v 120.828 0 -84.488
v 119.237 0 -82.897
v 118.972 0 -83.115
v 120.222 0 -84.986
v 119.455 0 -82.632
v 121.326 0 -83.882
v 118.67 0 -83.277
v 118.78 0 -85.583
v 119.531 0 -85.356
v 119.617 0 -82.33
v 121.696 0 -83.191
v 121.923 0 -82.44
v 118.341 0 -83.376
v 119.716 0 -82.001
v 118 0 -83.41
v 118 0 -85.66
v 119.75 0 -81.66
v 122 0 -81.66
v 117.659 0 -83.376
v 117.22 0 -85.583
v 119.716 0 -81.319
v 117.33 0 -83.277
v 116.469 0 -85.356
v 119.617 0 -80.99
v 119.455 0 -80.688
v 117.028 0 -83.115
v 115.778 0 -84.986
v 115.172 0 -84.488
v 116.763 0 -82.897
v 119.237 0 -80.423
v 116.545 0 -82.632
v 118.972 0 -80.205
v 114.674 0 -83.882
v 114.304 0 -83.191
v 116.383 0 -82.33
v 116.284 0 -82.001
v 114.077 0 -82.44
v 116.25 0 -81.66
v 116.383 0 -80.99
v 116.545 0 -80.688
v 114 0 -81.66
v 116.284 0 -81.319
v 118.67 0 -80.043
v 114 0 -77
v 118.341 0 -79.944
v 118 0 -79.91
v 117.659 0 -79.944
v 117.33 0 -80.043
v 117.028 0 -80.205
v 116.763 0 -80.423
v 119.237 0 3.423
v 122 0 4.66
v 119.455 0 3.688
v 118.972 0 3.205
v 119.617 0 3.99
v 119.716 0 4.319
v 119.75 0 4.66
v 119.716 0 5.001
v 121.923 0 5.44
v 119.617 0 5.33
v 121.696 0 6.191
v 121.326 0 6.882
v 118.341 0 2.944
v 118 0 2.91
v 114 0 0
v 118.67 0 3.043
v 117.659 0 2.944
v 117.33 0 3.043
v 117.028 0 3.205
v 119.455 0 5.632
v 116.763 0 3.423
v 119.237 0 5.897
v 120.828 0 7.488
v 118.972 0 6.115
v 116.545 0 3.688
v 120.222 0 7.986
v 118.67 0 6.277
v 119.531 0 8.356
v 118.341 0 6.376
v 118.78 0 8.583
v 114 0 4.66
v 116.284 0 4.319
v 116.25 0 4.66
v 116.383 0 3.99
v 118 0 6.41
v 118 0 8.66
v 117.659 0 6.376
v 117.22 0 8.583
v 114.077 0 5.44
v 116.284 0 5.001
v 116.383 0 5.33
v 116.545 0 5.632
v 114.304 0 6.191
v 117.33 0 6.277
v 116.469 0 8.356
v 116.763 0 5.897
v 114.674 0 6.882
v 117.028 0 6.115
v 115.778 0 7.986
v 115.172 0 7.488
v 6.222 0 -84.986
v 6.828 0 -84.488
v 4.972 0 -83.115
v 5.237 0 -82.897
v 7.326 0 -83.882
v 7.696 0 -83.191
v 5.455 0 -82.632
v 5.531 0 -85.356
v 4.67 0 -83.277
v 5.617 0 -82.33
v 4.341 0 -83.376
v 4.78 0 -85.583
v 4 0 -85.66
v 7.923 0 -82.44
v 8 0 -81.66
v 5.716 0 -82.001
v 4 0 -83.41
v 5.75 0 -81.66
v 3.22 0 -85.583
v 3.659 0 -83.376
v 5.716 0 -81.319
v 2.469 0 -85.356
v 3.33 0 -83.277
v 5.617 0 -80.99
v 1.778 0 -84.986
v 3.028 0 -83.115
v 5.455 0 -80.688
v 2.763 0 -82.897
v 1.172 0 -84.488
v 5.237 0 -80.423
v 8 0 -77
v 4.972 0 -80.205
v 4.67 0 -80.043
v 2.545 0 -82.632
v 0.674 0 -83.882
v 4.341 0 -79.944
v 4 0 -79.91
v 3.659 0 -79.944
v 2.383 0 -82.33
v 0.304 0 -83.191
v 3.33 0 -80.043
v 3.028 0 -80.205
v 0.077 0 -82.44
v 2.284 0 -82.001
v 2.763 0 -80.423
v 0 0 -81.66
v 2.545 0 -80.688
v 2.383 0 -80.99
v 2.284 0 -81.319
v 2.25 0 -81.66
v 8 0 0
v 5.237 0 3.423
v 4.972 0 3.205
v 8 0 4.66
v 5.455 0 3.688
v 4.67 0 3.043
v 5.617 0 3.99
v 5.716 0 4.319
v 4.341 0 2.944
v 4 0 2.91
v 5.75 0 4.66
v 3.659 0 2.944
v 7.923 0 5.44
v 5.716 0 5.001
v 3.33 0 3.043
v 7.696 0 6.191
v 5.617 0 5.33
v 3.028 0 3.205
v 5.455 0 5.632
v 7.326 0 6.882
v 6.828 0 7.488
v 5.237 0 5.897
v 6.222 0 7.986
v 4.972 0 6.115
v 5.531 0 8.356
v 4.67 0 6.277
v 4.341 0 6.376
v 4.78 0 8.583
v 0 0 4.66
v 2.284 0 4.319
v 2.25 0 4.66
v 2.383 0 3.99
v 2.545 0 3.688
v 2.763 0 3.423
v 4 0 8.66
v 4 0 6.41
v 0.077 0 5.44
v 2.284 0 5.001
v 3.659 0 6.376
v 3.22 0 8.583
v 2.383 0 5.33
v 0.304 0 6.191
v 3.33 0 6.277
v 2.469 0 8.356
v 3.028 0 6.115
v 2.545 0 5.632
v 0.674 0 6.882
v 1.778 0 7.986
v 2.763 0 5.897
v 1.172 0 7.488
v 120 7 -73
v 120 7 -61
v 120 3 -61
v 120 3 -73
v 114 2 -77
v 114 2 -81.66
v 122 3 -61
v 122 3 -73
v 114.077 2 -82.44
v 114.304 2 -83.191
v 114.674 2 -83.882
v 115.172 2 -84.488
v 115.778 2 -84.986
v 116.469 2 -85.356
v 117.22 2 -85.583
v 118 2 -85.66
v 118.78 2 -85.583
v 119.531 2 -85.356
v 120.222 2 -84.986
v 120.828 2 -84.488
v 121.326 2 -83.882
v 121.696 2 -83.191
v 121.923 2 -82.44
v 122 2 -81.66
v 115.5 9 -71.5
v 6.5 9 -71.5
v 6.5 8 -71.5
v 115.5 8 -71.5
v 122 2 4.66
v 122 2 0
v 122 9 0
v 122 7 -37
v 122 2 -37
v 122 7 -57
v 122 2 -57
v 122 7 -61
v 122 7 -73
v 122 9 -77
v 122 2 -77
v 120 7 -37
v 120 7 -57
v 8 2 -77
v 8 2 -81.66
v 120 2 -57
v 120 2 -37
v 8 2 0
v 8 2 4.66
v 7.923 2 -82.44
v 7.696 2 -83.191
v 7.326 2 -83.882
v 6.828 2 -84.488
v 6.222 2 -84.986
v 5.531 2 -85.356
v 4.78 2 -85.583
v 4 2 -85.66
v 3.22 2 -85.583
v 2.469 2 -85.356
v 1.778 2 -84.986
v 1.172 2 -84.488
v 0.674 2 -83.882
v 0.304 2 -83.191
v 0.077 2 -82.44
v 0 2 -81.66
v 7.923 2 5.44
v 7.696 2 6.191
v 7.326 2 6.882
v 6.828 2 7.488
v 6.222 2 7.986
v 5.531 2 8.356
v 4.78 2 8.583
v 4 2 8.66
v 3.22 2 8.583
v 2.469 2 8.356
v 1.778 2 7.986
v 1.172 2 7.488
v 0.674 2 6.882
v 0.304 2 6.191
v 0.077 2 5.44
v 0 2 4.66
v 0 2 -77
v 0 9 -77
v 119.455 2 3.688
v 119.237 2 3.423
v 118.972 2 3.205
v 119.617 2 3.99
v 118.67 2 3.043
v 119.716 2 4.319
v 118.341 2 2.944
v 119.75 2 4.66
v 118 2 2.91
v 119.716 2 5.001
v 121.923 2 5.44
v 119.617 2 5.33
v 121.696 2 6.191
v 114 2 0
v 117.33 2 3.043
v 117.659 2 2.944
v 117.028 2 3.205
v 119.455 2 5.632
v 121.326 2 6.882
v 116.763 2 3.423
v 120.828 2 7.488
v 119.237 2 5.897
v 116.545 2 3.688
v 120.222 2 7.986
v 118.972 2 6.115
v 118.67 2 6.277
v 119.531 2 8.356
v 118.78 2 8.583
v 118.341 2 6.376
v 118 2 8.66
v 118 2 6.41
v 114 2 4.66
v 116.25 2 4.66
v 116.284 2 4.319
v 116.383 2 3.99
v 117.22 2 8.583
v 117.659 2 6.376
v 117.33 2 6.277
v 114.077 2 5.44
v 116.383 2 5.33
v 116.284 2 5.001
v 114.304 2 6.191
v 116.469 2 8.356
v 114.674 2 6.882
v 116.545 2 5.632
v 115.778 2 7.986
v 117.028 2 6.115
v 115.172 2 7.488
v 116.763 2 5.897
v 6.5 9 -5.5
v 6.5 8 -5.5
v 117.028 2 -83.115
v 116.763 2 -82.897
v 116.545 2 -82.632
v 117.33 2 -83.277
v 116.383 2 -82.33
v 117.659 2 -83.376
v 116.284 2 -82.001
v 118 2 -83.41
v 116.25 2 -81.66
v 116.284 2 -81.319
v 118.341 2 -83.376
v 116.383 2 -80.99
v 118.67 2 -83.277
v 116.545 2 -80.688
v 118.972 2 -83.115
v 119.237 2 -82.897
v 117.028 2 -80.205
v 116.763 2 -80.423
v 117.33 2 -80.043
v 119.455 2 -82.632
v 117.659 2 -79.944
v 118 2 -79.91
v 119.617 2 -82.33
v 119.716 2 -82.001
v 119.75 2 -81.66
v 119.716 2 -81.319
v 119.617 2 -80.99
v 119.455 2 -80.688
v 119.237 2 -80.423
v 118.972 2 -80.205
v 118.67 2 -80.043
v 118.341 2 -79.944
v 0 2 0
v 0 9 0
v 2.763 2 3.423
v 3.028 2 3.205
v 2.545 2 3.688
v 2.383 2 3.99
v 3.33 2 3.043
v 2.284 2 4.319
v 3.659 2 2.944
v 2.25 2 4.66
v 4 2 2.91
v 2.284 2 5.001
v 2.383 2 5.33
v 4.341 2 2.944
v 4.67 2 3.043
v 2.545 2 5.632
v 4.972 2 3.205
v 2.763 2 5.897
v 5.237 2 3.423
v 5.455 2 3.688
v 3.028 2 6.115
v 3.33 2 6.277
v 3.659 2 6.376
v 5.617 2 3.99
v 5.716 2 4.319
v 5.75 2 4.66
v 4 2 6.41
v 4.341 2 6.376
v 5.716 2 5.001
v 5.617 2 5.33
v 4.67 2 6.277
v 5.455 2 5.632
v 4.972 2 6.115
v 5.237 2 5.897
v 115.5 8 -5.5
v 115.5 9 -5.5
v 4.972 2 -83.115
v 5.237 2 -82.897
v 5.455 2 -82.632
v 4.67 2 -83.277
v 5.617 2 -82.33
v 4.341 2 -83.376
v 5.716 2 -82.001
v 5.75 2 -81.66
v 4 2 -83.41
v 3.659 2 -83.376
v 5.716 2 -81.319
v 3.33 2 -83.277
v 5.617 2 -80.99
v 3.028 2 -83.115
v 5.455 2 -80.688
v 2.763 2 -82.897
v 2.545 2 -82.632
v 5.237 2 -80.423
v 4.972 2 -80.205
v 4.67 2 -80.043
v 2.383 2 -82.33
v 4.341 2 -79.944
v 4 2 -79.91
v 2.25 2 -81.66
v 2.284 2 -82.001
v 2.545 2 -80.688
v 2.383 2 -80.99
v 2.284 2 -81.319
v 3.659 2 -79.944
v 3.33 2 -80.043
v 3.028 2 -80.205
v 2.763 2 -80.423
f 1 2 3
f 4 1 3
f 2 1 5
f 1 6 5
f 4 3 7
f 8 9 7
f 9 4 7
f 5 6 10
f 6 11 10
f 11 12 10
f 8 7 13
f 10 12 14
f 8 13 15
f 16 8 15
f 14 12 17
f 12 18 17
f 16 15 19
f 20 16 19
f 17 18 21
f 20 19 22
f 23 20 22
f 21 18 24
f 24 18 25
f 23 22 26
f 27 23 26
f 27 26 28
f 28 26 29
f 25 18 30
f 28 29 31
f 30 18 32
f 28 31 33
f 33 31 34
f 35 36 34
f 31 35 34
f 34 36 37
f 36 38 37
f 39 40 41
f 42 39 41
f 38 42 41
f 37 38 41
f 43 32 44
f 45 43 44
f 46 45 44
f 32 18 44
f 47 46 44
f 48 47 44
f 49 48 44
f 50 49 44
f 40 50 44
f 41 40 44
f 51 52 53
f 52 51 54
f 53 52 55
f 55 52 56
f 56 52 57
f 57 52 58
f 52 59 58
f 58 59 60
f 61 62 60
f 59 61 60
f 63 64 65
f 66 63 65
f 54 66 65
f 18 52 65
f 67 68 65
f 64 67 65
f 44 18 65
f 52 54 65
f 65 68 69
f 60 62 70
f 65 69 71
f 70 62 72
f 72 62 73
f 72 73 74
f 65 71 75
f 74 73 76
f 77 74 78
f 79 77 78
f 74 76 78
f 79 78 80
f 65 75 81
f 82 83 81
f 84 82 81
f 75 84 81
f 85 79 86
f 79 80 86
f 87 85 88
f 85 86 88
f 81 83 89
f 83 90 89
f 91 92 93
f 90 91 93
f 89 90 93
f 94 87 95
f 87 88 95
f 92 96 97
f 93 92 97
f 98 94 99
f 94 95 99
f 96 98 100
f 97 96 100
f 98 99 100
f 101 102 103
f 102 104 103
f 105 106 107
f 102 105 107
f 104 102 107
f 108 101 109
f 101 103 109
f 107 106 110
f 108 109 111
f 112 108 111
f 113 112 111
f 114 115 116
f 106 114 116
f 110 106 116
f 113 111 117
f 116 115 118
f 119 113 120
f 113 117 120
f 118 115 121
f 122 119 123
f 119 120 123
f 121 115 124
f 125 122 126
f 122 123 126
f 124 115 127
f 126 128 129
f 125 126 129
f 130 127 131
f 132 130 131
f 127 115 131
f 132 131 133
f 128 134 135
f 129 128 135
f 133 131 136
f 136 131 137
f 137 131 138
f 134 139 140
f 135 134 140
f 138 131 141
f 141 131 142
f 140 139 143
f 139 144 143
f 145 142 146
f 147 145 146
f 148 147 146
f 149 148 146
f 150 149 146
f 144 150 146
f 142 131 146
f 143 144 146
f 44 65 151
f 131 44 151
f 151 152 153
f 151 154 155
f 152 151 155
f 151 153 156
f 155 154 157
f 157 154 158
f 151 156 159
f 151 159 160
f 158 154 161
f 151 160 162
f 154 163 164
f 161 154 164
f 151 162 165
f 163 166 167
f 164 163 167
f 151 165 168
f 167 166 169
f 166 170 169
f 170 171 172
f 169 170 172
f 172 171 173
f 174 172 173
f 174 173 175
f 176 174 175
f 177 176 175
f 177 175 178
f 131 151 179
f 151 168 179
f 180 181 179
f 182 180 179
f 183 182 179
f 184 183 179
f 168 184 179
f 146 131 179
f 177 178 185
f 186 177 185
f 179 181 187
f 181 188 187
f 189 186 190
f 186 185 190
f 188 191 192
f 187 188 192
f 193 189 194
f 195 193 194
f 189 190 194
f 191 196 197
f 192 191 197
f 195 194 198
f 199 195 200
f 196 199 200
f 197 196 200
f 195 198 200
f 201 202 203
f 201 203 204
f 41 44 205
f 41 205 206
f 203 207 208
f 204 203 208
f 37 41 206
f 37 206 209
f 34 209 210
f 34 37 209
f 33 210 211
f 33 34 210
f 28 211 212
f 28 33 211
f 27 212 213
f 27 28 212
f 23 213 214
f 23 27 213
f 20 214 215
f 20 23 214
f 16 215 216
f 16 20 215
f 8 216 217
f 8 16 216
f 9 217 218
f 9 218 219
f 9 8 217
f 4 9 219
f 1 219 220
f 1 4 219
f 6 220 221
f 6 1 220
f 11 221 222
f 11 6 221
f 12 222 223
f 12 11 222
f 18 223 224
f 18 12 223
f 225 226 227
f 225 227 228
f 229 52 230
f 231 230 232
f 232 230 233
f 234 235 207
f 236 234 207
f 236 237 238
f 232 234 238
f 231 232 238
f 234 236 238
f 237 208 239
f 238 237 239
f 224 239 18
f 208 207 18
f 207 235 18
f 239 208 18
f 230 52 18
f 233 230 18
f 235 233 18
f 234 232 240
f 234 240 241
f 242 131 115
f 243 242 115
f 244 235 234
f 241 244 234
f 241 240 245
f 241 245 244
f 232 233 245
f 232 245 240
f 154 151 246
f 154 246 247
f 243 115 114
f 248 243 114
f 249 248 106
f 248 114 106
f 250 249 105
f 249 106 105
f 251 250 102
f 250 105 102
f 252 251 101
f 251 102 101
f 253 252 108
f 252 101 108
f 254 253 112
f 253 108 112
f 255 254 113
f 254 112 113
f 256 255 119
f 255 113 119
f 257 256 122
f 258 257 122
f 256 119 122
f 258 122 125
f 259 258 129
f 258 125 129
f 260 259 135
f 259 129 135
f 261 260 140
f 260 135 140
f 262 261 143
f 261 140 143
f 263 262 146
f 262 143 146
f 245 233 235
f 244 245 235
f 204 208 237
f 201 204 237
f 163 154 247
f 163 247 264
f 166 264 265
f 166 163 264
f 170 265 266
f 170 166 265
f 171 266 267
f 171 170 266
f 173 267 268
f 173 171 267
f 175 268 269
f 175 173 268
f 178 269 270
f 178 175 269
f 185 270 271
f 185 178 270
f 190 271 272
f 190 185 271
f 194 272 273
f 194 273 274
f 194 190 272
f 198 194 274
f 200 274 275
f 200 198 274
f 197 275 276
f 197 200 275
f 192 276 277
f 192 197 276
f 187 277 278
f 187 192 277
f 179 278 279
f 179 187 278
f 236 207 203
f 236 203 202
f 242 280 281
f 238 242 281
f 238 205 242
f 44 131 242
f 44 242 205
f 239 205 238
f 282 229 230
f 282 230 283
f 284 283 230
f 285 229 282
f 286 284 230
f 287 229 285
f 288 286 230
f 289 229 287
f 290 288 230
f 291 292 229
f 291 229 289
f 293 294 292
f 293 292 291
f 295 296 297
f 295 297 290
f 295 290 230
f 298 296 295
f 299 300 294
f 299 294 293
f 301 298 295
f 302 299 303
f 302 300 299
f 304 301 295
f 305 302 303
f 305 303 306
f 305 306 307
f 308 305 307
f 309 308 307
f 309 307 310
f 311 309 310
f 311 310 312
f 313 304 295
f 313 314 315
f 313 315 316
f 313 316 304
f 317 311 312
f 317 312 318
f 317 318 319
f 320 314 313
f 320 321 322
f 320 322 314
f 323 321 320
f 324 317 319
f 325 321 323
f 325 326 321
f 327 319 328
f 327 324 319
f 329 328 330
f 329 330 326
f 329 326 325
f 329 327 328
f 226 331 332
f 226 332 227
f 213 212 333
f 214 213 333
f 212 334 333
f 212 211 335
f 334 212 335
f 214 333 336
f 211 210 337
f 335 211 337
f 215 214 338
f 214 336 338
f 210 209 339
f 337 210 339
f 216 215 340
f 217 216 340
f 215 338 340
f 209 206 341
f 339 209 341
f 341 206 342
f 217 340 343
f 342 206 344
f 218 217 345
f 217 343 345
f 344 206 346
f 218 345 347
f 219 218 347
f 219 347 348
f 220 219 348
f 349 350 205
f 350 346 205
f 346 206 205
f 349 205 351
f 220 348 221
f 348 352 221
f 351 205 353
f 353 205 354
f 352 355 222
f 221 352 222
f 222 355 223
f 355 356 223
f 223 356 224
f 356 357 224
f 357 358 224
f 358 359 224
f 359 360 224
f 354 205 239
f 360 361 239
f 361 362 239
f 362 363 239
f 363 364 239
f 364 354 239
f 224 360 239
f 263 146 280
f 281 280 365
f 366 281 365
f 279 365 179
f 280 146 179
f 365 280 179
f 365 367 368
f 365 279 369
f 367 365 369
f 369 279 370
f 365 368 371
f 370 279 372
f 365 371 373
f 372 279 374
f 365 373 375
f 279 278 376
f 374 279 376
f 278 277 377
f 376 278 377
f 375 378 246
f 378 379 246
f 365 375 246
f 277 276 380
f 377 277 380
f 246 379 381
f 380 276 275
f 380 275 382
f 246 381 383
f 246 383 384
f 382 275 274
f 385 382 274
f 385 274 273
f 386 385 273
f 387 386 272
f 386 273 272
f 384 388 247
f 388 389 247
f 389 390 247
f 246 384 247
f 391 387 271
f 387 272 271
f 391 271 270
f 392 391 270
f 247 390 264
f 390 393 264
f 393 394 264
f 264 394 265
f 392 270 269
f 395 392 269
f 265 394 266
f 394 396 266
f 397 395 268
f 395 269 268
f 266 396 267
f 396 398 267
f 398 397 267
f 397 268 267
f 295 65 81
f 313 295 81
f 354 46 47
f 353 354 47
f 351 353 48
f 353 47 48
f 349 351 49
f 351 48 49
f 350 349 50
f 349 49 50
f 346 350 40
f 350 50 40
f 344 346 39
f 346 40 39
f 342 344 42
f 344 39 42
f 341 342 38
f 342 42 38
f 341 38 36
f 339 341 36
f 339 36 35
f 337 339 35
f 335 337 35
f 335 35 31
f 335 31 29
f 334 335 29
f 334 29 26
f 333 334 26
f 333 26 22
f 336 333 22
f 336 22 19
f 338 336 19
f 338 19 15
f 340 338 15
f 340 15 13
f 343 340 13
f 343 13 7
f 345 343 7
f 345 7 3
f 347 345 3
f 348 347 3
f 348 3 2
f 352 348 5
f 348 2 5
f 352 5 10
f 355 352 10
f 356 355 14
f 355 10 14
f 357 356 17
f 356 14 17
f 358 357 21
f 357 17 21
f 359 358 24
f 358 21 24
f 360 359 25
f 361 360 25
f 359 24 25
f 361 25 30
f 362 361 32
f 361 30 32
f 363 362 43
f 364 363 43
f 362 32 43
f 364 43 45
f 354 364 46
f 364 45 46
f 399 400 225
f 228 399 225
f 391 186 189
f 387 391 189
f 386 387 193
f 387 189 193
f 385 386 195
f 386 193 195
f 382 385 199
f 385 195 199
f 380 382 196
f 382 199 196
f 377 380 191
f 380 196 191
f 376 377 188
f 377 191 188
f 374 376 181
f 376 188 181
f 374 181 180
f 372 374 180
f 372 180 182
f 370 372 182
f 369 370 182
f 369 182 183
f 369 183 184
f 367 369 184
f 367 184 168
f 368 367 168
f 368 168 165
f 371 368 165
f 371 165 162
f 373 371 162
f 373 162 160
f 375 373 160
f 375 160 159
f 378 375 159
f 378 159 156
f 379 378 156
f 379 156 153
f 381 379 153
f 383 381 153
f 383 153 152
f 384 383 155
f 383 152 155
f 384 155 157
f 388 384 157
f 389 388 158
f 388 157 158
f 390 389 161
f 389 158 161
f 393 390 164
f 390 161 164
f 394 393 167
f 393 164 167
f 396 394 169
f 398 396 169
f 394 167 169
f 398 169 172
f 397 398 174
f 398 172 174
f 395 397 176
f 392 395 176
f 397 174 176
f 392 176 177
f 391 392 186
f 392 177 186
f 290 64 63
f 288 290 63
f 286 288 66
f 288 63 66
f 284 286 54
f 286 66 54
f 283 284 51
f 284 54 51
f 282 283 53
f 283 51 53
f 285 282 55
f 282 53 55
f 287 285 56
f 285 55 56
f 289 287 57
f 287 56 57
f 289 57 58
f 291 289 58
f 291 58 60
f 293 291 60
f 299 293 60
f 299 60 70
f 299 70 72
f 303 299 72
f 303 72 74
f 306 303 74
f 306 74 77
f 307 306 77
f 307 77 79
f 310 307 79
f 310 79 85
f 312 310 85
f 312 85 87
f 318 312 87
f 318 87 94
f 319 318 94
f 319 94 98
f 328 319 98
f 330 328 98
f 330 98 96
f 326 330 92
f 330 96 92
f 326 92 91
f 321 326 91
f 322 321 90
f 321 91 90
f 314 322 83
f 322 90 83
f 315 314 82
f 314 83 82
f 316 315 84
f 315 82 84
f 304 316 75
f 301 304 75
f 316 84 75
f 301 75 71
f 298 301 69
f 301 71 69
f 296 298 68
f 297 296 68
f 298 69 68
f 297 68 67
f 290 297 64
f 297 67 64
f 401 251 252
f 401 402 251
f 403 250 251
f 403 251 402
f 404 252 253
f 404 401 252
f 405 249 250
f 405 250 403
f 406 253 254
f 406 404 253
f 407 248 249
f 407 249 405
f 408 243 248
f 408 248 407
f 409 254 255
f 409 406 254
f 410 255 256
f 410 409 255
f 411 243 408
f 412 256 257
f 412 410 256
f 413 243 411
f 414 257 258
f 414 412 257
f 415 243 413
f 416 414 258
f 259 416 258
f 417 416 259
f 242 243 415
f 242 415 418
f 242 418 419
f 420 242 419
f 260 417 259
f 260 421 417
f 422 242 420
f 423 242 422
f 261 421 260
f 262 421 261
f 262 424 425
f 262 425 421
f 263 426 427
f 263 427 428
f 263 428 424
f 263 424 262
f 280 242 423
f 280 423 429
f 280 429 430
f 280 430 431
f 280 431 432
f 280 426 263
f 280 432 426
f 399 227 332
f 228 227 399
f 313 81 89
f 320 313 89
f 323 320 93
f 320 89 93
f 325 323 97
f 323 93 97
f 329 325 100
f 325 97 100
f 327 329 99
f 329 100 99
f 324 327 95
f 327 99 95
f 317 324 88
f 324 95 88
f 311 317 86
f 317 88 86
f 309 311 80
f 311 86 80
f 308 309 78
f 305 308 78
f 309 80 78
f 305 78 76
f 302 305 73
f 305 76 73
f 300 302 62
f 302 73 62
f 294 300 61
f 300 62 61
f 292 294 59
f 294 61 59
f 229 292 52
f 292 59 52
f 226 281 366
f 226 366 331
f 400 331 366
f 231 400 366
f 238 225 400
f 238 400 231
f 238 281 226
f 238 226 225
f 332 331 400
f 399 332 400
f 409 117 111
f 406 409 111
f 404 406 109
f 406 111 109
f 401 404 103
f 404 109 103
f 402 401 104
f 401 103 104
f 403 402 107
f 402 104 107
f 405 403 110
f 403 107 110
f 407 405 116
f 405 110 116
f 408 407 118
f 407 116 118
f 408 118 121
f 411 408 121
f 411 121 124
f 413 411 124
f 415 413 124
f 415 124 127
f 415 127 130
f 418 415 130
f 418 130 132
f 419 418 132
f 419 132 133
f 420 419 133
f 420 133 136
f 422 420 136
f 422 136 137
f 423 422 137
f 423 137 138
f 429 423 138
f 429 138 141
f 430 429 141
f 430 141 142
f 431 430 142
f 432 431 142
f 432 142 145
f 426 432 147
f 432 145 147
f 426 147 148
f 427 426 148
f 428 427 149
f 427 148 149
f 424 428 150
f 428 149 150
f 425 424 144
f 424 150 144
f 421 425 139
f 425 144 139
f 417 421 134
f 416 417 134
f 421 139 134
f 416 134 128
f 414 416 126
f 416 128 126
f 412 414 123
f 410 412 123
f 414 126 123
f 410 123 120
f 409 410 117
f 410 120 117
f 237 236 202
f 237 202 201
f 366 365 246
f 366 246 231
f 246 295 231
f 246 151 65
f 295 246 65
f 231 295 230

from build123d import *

# Parameters (mm, degrees)
SKETCH1_W           = 122
SKETCH1_H           = 77
BOSS_EXTRUDE1_DEPTH = 9
SKETCH2_W           = 109
SKETCH2_H           = 66
CUT_EXTRUDE1_DEPTH  = 1
BOSS_EXTRUDE2_DEPTH = 2
SKETCH4_R           = 1.75
CUT_EXTRUDE3_DEPTH  = 4
SKETCH5_W           = 12
SKETCH5_H           = 4
SKETCH5_W_2         = 20
SKETCH5_H_2         = 5
CUT_EXTRUDE4_DEPTH  = 2


with BuildPart() as part:
    # Sketch1 → Boss-Extrude1 (new body)
    with BuildSketch(Plane(origin=(0, 0, 0), x_dir=(1, 0, 0), z_dir=(0, 1, 0))):
        with Locations((61, 38.5)):
            Rectangle(SKETCH1_W, SKETCH1_H)
    extrude(amount=BOSS_EXTRUDE1_DEPTH)

    # Sketch2 → Cut-Extrude1 (cut)
    with BuildSketch(Plane(origin=(0, 9, 0), x_dir=(1, 0, 0), z_dir=(0, 1, 0))):
        with Locations((61, 38.5)):
            Rectangle(SKETCH2_W, SKETCH2_H)
    extrude(amount=-CUT_EXTRUDE1_DEPTH, mode=Mode.SUBTRACT)

    # Sketch3 → Boss-Extrude2 (add)
    with BuildSketch(Plane.XZ):
        with BuildLine():
            Line((0, -81.66), (0, -72.34))
            ThreePointArc((0, -72.34), (4, -68.34), (8, -72.34))
            Line((8, -72.34), (8, -81.66))
            ThreePointArc((8, -81.66), (4, -85.66), (0, -81.66))
        make_face()
        with BuildLine():
            Line((122, -81.66), (122, -72.34))
            ThreePointArc((122, -72.34), (118, -68.34), (114, -72.34))
            Line((114, -72.34), (114, -81.66))
            ThreePointArc((114, -81.66), (118, -85.66), (122, -81.66))
        make_face()
        with BuildLine():
            Line((0, 4.66), (0, -4.66))
            ThreePointArc((0, -4.66), (4, -8.66), (8, -4.66))
            Line((8, -4.66), (8, 4.66))
            ThreePointArc((8, 4.66), (4, 8.66), (0, 4.66))
        make_face()
        with BuildLine():
            Line((122, 4.66), (122, -4.66))
            ThreePointArc((122, -4.66), (118, -8.66), (114, -4.66))
            Line((114, -4.66), (114, 4.66))
            ThreePointArc((114, 4.66), (118, 8.66), (122, 4.66))
        make_face()
    extrude(amount=-BOSS_EXTRUDE2_DEPTH)

    # Sketch4 → Cut-Extrude3 (cut)
    with BuildSketch(Plane.XZ):
        with Locations(Location((4, -81.66, 0), (0, 0, 270))):
            Circle(SKETCH4_R)
        with Locations(Location((118, -81.66, 0), (0, 0, 90))):
            Circle(SKETCH4_R)
        with Locations(Location((4, 4.66, 0), (0, 0, 90))):
            Circle(SKETCH4_R)
        with Locations(Location((118, 4.66, 0), (0, 0, 270))):
            Circle(SKETCH4_R)
    extrude(amount=-CUT_EXTRUDE3_DEPTH, mode=Mode.SUBTRACT)

    # Sketch5 → Cut-Extrude4 (cut)
    with BuildSketch(Plane(origin=(122, 0, 0), x_dir=(0, 0, -1), z_dir=(1, 0, 0))):
        with Locations((67, 5)):
            Rectangle(SKETCH5_W, SKETCH5_H)
        with Locations((47, 4.5)):
            Rectangle(SKETCH5_W_2, SKETCH5_H_2)
    extrude(amount=-CUT_EXTRUDE4_DEPTH, mode=Mode.SUBTRACT)


solid = part.part
